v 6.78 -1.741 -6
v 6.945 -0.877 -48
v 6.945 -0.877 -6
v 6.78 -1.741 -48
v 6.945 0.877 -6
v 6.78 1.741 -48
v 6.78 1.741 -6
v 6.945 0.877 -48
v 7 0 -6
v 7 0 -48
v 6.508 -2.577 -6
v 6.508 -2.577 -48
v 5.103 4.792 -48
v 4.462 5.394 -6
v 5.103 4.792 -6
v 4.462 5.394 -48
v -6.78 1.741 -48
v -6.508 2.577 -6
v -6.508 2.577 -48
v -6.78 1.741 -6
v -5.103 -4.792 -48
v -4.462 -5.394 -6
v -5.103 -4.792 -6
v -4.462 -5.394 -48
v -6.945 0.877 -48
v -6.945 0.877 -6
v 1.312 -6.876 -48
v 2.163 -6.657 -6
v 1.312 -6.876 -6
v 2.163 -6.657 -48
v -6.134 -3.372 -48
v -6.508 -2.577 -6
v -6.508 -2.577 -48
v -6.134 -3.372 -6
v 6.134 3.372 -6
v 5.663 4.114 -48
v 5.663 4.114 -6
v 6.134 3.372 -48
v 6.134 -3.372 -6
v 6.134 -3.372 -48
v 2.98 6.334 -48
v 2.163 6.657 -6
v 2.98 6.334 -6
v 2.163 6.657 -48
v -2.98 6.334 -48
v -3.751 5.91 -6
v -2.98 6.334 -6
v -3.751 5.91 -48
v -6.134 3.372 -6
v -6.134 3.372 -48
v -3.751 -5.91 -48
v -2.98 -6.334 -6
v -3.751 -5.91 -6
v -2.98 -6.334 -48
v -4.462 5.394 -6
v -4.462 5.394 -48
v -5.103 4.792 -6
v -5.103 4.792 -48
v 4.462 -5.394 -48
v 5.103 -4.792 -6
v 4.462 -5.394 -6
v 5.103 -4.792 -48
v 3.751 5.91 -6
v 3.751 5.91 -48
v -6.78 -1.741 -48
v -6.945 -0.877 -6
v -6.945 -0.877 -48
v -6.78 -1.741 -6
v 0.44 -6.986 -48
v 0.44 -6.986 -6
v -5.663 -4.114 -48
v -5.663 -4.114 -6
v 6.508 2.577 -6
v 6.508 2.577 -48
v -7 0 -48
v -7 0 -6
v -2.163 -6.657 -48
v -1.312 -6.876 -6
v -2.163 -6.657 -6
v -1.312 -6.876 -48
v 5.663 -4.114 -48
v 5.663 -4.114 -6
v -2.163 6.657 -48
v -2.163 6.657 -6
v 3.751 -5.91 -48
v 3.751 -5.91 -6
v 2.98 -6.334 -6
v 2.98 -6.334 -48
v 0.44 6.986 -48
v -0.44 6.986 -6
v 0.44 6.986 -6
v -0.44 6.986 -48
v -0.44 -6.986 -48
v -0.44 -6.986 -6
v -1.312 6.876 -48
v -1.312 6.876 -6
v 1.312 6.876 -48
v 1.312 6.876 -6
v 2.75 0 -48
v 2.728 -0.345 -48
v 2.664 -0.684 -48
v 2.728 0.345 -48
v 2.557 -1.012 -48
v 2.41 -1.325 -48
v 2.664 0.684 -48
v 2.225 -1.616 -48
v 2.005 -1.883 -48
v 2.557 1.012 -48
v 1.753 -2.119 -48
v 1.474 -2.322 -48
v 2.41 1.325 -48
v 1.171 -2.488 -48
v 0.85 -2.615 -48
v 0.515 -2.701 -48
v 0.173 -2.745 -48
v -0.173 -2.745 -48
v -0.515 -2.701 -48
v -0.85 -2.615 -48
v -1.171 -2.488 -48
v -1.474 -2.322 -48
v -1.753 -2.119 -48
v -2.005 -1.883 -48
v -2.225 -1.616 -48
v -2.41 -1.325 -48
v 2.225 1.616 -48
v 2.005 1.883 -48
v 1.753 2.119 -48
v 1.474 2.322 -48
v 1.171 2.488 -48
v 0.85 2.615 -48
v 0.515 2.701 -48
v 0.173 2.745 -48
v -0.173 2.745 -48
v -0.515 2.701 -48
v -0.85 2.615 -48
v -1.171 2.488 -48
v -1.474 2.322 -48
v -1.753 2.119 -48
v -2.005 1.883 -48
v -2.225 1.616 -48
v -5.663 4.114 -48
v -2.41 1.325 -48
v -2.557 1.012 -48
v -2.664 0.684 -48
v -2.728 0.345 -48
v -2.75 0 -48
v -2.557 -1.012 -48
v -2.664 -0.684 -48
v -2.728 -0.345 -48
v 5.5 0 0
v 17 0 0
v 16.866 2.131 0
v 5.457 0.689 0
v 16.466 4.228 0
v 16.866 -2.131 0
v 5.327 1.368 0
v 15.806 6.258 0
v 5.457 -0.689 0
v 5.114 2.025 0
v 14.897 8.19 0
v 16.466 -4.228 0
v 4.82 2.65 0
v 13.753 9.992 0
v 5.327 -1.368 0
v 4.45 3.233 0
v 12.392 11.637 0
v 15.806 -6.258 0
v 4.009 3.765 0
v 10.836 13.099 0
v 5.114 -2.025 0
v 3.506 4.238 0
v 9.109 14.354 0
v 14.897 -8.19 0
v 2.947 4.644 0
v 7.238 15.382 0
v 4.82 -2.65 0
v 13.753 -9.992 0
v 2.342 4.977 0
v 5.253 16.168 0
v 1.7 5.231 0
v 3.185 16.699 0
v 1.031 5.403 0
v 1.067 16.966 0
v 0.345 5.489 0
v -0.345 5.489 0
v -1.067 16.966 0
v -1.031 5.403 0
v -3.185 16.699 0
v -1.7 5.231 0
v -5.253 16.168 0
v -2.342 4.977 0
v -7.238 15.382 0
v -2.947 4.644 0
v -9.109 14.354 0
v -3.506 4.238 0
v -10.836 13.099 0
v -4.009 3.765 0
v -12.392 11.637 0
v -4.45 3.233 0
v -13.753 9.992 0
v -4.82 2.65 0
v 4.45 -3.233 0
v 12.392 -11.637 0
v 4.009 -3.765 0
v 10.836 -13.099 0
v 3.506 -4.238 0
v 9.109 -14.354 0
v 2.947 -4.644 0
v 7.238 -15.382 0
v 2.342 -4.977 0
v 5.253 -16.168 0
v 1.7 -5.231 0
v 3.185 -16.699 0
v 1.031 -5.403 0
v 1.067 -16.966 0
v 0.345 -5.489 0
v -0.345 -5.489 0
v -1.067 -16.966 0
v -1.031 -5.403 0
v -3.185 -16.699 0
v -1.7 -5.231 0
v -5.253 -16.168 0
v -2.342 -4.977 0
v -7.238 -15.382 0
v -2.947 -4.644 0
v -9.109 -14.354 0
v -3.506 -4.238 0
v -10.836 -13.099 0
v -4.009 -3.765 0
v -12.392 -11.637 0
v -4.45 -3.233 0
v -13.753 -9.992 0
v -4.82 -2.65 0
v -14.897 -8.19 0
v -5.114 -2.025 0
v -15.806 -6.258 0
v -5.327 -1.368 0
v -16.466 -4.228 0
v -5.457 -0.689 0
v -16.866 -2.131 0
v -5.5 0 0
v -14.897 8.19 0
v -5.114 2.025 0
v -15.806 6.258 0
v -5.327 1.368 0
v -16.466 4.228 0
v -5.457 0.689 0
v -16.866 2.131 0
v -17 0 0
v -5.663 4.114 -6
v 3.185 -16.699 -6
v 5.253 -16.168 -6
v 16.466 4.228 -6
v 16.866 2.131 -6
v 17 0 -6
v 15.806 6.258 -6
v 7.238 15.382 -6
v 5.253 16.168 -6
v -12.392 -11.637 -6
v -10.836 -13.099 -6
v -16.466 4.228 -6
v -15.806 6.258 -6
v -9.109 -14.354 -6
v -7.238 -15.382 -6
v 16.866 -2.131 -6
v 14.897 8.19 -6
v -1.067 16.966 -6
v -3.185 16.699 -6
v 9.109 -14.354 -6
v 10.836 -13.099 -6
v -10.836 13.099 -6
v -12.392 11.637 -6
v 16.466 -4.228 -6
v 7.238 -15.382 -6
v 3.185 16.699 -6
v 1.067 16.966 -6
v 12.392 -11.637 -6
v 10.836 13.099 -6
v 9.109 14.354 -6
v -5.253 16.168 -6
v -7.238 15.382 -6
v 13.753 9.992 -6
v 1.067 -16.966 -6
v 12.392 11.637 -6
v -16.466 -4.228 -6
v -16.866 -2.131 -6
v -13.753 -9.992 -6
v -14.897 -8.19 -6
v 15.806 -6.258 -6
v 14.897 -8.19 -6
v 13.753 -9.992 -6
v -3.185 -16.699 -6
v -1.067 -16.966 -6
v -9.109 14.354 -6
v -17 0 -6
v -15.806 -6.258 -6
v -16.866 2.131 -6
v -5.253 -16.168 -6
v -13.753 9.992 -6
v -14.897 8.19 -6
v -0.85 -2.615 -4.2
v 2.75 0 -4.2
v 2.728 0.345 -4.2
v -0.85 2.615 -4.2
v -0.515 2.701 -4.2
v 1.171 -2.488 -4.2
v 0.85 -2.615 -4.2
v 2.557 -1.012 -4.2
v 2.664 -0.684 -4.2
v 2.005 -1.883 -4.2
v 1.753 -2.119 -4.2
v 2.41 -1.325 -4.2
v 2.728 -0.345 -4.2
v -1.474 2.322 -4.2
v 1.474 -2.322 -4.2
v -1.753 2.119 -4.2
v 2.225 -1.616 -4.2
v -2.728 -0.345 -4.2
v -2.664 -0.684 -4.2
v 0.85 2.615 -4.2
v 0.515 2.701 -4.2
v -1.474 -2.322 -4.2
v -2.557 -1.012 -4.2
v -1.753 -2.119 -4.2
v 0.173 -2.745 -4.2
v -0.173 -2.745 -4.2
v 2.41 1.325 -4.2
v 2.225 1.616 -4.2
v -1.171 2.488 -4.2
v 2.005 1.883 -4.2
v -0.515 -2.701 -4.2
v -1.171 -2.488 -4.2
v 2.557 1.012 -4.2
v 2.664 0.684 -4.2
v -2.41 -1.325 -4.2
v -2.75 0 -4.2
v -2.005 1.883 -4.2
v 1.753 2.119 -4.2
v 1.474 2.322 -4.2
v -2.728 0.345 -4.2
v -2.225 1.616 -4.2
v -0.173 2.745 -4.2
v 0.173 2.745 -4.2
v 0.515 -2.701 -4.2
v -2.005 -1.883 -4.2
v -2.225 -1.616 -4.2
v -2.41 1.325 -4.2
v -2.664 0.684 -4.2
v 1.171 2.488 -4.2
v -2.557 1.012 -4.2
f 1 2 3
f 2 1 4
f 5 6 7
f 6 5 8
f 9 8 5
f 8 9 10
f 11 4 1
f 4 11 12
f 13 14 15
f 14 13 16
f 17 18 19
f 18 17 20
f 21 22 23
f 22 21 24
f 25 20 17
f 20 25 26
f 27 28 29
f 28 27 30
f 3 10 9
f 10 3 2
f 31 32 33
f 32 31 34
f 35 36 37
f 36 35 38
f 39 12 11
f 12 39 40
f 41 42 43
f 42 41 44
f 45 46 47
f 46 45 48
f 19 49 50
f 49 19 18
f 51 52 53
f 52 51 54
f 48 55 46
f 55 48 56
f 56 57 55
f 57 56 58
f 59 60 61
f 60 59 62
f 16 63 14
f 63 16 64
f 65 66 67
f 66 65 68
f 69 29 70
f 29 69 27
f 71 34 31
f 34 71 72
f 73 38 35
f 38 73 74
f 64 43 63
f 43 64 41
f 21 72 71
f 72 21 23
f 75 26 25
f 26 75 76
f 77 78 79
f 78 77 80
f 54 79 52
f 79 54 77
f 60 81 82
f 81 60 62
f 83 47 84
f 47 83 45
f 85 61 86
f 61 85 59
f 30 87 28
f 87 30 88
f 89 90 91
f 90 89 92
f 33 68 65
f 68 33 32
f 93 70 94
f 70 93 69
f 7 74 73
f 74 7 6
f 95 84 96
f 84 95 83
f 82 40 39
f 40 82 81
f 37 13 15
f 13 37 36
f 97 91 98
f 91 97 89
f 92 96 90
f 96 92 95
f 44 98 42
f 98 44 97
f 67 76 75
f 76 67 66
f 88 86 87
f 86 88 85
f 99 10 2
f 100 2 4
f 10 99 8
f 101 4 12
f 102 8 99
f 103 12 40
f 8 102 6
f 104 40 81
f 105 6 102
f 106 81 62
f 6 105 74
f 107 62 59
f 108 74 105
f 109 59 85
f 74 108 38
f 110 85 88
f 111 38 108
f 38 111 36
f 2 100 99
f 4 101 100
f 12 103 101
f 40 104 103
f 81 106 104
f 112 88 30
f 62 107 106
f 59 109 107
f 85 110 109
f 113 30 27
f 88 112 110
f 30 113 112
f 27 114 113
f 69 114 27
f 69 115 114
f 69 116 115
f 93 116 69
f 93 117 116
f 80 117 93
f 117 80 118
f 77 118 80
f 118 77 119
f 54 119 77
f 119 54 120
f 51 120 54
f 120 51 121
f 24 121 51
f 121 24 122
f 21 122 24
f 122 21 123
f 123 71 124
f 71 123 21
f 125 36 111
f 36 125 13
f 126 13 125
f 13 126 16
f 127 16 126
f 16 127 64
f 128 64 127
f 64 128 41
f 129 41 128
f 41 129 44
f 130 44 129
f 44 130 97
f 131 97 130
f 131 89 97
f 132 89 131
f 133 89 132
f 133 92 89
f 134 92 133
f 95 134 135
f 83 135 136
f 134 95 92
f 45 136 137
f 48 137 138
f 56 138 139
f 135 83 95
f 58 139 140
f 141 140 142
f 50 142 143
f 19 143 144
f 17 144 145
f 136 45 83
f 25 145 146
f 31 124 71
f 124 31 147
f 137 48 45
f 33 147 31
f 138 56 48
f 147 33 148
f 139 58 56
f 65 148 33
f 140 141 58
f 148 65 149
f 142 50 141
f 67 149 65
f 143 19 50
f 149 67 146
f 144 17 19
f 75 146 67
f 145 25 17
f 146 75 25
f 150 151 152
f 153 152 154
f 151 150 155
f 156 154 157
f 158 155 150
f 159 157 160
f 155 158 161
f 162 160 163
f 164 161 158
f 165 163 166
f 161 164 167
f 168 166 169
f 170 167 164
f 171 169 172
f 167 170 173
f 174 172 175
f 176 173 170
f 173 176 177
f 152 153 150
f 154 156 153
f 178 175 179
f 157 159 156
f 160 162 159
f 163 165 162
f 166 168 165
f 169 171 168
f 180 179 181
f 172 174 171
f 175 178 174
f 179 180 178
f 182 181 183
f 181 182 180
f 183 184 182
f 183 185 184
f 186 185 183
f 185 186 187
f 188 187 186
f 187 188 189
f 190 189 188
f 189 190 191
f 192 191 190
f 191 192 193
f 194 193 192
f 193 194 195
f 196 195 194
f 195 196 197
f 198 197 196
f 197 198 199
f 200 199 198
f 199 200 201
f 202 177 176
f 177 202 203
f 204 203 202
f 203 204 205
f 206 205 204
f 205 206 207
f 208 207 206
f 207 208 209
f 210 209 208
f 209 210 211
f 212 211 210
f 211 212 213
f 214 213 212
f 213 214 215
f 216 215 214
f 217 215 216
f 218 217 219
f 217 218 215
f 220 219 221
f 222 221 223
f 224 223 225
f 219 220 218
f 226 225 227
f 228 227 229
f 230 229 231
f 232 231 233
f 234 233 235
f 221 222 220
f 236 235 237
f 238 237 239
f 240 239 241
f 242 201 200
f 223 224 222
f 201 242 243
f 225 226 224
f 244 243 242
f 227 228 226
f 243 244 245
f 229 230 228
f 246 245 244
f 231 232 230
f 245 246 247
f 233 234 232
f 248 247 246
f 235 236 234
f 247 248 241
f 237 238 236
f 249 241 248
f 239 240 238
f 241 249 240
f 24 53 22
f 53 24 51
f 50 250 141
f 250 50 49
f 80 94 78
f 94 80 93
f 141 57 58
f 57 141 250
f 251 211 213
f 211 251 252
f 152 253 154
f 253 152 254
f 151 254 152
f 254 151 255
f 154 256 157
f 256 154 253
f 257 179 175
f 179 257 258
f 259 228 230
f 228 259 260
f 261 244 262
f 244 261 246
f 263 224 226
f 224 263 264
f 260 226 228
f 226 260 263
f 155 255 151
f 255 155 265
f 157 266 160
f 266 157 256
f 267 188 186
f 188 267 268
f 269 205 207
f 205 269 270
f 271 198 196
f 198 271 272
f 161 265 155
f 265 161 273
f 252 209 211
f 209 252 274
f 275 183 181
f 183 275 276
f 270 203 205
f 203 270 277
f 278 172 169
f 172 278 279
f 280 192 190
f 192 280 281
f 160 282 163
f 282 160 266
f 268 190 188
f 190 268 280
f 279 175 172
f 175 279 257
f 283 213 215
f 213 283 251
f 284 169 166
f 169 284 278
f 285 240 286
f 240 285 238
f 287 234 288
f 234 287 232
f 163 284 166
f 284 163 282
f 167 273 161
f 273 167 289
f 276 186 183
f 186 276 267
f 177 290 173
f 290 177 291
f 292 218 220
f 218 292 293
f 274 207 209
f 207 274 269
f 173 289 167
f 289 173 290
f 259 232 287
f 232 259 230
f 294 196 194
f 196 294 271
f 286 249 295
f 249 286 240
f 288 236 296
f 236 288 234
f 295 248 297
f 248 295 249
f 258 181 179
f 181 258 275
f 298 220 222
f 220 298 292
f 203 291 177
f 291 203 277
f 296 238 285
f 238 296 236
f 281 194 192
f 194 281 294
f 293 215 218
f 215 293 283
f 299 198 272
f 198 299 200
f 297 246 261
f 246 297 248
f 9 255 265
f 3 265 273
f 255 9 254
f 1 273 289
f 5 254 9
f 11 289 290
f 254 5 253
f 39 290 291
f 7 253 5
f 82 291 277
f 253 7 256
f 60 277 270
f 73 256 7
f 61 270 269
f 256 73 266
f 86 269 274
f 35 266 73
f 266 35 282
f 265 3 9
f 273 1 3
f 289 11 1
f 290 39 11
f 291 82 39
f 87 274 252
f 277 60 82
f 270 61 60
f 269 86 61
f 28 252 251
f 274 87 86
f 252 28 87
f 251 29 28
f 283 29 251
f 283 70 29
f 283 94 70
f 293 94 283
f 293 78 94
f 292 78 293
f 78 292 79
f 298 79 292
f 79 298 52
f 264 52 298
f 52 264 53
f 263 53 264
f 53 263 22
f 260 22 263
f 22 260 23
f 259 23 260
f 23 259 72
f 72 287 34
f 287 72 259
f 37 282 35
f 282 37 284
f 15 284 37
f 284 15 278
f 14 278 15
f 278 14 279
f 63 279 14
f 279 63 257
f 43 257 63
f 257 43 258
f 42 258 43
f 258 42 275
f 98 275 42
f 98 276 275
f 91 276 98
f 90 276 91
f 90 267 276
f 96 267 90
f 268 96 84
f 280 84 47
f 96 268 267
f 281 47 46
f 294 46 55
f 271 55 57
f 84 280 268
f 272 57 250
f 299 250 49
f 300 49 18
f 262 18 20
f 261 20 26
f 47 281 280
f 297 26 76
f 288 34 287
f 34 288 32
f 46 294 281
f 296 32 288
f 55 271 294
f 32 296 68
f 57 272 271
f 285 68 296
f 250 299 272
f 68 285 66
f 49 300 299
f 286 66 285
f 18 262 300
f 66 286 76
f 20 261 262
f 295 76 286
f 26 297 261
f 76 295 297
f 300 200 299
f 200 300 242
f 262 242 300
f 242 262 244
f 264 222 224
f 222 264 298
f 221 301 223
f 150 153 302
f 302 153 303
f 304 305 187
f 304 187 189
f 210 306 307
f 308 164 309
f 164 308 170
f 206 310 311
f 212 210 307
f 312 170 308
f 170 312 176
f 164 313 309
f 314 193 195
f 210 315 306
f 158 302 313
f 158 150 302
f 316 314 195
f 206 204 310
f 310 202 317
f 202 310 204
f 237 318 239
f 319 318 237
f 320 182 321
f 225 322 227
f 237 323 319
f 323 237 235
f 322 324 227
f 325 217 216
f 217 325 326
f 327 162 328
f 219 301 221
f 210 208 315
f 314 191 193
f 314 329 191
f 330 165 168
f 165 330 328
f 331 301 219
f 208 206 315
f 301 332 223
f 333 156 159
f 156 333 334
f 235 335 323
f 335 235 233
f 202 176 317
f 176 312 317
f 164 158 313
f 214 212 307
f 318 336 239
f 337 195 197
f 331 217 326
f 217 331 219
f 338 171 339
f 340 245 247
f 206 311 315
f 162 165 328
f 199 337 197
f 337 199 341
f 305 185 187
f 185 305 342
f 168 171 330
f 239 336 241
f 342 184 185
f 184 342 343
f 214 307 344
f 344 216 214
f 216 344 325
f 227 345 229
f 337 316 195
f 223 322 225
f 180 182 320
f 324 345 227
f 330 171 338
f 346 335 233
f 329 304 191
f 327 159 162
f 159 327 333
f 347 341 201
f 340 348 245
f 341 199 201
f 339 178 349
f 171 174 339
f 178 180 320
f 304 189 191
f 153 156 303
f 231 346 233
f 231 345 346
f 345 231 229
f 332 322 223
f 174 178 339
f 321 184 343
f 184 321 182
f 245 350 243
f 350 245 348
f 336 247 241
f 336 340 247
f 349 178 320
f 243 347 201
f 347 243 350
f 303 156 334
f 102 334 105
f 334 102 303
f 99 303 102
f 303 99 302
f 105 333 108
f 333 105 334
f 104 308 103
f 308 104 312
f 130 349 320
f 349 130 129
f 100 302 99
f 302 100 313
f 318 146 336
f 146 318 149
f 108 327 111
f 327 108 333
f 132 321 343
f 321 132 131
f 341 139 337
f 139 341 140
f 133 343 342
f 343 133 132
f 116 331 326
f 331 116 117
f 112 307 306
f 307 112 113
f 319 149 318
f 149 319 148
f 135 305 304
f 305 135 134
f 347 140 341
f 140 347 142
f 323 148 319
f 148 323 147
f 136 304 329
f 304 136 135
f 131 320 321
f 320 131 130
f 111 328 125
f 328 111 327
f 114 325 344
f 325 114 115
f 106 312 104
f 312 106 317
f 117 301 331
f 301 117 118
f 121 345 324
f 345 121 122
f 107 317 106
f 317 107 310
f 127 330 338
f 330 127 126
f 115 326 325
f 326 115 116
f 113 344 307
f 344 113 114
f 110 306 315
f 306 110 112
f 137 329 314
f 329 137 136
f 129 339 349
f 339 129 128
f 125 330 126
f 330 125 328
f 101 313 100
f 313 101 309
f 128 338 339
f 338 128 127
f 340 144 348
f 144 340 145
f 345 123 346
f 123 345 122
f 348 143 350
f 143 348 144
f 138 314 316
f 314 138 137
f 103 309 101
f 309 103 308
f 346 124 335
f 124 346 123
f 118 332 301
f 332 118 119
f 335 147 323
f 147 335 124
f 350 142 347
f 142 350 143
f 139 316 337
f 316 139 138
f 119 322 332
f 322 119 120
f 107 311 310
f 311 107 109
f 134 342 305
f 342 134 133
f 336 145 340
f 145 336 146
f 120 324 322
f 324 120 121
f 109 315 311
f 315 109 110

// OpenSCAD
$fn = 50;


difference() {
	union() {
		translate(v = [0, 0, -48.0000000000]) {
			cylinder(h = 48, r = 7.0000000000);
		}
		translate(v = [0, 0, -6.0000000000]) {
			cylinder(h = 6, r = 17.0000000000);
		}
	}
	union() {
		translate(v = [0, 0, 0]) {
			rotate(a = [0, 0, 0]) {
				difference() {
					union() {
						#translate(v = [0, 0, -48.0000000000]) {
							cylinder(h = 48, r = 2.2500000000);
						}
						#translate(v = [0, 0, -4.2000000000]) {
							cylinder(h = 4.2000000000, r1 = 2.7500000000, r2 = 5.5000000000);
						}
						#translate(v = [0, 0, -48.0000000000]) {
							cylinder(h = 48, r = 2.7500000000);
						}
						#translate(v = [0, 0, -48.0000000000]) {
							cylinder(h = 48, r = 2.2500000000);
						}
					}
					union();
				}
			}
		}
	}
}
